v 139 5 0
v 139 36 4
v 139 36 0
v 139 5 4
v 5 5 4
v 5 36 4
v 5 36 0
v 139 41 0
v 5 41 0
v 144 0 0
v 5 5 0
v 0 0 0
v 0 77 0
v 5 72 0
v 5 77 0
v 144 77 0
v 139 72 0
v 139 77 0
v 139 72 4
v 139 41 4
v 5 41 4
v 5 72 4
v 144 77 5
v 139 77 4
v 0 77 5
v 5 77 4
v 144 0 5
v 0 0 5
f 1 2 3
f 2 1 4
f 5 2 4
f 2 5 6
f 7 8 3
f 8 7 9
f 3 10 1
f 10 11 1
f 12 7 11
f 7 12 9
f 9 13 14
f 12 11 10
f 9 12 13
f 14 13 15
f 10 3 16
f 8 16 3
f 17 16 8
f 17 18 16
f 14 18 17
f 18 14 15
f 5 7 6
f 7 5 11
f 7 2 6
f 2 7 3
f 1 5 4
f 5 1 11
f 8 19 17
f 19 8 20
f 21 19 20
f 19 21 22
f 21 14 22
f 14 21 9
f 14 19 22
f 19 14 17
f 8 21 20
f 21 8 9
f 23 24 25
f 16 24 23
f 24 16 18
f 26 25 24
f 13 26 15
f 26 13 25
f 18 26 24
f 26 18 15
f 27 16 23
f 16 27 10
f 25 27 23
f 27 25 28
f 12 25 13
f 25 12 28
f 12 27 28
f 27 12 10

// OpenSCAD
ram_width = 134;
ram_height = 31;
ram_thick = 4;

frame_size = 5;

number_of_ram = 2;


difference(){
cube([ram_width+frame_size*2,ram_height*number_of_ram+frame_size*(number_of_ram+1),5]);
    
for(i=[0:number_of_ram]){
    translate([frame_size,(ram_height+frame_size)*i+frame_size,0])
    cube([ram_width,ram_height,ram_thick]);    
    
}
}
